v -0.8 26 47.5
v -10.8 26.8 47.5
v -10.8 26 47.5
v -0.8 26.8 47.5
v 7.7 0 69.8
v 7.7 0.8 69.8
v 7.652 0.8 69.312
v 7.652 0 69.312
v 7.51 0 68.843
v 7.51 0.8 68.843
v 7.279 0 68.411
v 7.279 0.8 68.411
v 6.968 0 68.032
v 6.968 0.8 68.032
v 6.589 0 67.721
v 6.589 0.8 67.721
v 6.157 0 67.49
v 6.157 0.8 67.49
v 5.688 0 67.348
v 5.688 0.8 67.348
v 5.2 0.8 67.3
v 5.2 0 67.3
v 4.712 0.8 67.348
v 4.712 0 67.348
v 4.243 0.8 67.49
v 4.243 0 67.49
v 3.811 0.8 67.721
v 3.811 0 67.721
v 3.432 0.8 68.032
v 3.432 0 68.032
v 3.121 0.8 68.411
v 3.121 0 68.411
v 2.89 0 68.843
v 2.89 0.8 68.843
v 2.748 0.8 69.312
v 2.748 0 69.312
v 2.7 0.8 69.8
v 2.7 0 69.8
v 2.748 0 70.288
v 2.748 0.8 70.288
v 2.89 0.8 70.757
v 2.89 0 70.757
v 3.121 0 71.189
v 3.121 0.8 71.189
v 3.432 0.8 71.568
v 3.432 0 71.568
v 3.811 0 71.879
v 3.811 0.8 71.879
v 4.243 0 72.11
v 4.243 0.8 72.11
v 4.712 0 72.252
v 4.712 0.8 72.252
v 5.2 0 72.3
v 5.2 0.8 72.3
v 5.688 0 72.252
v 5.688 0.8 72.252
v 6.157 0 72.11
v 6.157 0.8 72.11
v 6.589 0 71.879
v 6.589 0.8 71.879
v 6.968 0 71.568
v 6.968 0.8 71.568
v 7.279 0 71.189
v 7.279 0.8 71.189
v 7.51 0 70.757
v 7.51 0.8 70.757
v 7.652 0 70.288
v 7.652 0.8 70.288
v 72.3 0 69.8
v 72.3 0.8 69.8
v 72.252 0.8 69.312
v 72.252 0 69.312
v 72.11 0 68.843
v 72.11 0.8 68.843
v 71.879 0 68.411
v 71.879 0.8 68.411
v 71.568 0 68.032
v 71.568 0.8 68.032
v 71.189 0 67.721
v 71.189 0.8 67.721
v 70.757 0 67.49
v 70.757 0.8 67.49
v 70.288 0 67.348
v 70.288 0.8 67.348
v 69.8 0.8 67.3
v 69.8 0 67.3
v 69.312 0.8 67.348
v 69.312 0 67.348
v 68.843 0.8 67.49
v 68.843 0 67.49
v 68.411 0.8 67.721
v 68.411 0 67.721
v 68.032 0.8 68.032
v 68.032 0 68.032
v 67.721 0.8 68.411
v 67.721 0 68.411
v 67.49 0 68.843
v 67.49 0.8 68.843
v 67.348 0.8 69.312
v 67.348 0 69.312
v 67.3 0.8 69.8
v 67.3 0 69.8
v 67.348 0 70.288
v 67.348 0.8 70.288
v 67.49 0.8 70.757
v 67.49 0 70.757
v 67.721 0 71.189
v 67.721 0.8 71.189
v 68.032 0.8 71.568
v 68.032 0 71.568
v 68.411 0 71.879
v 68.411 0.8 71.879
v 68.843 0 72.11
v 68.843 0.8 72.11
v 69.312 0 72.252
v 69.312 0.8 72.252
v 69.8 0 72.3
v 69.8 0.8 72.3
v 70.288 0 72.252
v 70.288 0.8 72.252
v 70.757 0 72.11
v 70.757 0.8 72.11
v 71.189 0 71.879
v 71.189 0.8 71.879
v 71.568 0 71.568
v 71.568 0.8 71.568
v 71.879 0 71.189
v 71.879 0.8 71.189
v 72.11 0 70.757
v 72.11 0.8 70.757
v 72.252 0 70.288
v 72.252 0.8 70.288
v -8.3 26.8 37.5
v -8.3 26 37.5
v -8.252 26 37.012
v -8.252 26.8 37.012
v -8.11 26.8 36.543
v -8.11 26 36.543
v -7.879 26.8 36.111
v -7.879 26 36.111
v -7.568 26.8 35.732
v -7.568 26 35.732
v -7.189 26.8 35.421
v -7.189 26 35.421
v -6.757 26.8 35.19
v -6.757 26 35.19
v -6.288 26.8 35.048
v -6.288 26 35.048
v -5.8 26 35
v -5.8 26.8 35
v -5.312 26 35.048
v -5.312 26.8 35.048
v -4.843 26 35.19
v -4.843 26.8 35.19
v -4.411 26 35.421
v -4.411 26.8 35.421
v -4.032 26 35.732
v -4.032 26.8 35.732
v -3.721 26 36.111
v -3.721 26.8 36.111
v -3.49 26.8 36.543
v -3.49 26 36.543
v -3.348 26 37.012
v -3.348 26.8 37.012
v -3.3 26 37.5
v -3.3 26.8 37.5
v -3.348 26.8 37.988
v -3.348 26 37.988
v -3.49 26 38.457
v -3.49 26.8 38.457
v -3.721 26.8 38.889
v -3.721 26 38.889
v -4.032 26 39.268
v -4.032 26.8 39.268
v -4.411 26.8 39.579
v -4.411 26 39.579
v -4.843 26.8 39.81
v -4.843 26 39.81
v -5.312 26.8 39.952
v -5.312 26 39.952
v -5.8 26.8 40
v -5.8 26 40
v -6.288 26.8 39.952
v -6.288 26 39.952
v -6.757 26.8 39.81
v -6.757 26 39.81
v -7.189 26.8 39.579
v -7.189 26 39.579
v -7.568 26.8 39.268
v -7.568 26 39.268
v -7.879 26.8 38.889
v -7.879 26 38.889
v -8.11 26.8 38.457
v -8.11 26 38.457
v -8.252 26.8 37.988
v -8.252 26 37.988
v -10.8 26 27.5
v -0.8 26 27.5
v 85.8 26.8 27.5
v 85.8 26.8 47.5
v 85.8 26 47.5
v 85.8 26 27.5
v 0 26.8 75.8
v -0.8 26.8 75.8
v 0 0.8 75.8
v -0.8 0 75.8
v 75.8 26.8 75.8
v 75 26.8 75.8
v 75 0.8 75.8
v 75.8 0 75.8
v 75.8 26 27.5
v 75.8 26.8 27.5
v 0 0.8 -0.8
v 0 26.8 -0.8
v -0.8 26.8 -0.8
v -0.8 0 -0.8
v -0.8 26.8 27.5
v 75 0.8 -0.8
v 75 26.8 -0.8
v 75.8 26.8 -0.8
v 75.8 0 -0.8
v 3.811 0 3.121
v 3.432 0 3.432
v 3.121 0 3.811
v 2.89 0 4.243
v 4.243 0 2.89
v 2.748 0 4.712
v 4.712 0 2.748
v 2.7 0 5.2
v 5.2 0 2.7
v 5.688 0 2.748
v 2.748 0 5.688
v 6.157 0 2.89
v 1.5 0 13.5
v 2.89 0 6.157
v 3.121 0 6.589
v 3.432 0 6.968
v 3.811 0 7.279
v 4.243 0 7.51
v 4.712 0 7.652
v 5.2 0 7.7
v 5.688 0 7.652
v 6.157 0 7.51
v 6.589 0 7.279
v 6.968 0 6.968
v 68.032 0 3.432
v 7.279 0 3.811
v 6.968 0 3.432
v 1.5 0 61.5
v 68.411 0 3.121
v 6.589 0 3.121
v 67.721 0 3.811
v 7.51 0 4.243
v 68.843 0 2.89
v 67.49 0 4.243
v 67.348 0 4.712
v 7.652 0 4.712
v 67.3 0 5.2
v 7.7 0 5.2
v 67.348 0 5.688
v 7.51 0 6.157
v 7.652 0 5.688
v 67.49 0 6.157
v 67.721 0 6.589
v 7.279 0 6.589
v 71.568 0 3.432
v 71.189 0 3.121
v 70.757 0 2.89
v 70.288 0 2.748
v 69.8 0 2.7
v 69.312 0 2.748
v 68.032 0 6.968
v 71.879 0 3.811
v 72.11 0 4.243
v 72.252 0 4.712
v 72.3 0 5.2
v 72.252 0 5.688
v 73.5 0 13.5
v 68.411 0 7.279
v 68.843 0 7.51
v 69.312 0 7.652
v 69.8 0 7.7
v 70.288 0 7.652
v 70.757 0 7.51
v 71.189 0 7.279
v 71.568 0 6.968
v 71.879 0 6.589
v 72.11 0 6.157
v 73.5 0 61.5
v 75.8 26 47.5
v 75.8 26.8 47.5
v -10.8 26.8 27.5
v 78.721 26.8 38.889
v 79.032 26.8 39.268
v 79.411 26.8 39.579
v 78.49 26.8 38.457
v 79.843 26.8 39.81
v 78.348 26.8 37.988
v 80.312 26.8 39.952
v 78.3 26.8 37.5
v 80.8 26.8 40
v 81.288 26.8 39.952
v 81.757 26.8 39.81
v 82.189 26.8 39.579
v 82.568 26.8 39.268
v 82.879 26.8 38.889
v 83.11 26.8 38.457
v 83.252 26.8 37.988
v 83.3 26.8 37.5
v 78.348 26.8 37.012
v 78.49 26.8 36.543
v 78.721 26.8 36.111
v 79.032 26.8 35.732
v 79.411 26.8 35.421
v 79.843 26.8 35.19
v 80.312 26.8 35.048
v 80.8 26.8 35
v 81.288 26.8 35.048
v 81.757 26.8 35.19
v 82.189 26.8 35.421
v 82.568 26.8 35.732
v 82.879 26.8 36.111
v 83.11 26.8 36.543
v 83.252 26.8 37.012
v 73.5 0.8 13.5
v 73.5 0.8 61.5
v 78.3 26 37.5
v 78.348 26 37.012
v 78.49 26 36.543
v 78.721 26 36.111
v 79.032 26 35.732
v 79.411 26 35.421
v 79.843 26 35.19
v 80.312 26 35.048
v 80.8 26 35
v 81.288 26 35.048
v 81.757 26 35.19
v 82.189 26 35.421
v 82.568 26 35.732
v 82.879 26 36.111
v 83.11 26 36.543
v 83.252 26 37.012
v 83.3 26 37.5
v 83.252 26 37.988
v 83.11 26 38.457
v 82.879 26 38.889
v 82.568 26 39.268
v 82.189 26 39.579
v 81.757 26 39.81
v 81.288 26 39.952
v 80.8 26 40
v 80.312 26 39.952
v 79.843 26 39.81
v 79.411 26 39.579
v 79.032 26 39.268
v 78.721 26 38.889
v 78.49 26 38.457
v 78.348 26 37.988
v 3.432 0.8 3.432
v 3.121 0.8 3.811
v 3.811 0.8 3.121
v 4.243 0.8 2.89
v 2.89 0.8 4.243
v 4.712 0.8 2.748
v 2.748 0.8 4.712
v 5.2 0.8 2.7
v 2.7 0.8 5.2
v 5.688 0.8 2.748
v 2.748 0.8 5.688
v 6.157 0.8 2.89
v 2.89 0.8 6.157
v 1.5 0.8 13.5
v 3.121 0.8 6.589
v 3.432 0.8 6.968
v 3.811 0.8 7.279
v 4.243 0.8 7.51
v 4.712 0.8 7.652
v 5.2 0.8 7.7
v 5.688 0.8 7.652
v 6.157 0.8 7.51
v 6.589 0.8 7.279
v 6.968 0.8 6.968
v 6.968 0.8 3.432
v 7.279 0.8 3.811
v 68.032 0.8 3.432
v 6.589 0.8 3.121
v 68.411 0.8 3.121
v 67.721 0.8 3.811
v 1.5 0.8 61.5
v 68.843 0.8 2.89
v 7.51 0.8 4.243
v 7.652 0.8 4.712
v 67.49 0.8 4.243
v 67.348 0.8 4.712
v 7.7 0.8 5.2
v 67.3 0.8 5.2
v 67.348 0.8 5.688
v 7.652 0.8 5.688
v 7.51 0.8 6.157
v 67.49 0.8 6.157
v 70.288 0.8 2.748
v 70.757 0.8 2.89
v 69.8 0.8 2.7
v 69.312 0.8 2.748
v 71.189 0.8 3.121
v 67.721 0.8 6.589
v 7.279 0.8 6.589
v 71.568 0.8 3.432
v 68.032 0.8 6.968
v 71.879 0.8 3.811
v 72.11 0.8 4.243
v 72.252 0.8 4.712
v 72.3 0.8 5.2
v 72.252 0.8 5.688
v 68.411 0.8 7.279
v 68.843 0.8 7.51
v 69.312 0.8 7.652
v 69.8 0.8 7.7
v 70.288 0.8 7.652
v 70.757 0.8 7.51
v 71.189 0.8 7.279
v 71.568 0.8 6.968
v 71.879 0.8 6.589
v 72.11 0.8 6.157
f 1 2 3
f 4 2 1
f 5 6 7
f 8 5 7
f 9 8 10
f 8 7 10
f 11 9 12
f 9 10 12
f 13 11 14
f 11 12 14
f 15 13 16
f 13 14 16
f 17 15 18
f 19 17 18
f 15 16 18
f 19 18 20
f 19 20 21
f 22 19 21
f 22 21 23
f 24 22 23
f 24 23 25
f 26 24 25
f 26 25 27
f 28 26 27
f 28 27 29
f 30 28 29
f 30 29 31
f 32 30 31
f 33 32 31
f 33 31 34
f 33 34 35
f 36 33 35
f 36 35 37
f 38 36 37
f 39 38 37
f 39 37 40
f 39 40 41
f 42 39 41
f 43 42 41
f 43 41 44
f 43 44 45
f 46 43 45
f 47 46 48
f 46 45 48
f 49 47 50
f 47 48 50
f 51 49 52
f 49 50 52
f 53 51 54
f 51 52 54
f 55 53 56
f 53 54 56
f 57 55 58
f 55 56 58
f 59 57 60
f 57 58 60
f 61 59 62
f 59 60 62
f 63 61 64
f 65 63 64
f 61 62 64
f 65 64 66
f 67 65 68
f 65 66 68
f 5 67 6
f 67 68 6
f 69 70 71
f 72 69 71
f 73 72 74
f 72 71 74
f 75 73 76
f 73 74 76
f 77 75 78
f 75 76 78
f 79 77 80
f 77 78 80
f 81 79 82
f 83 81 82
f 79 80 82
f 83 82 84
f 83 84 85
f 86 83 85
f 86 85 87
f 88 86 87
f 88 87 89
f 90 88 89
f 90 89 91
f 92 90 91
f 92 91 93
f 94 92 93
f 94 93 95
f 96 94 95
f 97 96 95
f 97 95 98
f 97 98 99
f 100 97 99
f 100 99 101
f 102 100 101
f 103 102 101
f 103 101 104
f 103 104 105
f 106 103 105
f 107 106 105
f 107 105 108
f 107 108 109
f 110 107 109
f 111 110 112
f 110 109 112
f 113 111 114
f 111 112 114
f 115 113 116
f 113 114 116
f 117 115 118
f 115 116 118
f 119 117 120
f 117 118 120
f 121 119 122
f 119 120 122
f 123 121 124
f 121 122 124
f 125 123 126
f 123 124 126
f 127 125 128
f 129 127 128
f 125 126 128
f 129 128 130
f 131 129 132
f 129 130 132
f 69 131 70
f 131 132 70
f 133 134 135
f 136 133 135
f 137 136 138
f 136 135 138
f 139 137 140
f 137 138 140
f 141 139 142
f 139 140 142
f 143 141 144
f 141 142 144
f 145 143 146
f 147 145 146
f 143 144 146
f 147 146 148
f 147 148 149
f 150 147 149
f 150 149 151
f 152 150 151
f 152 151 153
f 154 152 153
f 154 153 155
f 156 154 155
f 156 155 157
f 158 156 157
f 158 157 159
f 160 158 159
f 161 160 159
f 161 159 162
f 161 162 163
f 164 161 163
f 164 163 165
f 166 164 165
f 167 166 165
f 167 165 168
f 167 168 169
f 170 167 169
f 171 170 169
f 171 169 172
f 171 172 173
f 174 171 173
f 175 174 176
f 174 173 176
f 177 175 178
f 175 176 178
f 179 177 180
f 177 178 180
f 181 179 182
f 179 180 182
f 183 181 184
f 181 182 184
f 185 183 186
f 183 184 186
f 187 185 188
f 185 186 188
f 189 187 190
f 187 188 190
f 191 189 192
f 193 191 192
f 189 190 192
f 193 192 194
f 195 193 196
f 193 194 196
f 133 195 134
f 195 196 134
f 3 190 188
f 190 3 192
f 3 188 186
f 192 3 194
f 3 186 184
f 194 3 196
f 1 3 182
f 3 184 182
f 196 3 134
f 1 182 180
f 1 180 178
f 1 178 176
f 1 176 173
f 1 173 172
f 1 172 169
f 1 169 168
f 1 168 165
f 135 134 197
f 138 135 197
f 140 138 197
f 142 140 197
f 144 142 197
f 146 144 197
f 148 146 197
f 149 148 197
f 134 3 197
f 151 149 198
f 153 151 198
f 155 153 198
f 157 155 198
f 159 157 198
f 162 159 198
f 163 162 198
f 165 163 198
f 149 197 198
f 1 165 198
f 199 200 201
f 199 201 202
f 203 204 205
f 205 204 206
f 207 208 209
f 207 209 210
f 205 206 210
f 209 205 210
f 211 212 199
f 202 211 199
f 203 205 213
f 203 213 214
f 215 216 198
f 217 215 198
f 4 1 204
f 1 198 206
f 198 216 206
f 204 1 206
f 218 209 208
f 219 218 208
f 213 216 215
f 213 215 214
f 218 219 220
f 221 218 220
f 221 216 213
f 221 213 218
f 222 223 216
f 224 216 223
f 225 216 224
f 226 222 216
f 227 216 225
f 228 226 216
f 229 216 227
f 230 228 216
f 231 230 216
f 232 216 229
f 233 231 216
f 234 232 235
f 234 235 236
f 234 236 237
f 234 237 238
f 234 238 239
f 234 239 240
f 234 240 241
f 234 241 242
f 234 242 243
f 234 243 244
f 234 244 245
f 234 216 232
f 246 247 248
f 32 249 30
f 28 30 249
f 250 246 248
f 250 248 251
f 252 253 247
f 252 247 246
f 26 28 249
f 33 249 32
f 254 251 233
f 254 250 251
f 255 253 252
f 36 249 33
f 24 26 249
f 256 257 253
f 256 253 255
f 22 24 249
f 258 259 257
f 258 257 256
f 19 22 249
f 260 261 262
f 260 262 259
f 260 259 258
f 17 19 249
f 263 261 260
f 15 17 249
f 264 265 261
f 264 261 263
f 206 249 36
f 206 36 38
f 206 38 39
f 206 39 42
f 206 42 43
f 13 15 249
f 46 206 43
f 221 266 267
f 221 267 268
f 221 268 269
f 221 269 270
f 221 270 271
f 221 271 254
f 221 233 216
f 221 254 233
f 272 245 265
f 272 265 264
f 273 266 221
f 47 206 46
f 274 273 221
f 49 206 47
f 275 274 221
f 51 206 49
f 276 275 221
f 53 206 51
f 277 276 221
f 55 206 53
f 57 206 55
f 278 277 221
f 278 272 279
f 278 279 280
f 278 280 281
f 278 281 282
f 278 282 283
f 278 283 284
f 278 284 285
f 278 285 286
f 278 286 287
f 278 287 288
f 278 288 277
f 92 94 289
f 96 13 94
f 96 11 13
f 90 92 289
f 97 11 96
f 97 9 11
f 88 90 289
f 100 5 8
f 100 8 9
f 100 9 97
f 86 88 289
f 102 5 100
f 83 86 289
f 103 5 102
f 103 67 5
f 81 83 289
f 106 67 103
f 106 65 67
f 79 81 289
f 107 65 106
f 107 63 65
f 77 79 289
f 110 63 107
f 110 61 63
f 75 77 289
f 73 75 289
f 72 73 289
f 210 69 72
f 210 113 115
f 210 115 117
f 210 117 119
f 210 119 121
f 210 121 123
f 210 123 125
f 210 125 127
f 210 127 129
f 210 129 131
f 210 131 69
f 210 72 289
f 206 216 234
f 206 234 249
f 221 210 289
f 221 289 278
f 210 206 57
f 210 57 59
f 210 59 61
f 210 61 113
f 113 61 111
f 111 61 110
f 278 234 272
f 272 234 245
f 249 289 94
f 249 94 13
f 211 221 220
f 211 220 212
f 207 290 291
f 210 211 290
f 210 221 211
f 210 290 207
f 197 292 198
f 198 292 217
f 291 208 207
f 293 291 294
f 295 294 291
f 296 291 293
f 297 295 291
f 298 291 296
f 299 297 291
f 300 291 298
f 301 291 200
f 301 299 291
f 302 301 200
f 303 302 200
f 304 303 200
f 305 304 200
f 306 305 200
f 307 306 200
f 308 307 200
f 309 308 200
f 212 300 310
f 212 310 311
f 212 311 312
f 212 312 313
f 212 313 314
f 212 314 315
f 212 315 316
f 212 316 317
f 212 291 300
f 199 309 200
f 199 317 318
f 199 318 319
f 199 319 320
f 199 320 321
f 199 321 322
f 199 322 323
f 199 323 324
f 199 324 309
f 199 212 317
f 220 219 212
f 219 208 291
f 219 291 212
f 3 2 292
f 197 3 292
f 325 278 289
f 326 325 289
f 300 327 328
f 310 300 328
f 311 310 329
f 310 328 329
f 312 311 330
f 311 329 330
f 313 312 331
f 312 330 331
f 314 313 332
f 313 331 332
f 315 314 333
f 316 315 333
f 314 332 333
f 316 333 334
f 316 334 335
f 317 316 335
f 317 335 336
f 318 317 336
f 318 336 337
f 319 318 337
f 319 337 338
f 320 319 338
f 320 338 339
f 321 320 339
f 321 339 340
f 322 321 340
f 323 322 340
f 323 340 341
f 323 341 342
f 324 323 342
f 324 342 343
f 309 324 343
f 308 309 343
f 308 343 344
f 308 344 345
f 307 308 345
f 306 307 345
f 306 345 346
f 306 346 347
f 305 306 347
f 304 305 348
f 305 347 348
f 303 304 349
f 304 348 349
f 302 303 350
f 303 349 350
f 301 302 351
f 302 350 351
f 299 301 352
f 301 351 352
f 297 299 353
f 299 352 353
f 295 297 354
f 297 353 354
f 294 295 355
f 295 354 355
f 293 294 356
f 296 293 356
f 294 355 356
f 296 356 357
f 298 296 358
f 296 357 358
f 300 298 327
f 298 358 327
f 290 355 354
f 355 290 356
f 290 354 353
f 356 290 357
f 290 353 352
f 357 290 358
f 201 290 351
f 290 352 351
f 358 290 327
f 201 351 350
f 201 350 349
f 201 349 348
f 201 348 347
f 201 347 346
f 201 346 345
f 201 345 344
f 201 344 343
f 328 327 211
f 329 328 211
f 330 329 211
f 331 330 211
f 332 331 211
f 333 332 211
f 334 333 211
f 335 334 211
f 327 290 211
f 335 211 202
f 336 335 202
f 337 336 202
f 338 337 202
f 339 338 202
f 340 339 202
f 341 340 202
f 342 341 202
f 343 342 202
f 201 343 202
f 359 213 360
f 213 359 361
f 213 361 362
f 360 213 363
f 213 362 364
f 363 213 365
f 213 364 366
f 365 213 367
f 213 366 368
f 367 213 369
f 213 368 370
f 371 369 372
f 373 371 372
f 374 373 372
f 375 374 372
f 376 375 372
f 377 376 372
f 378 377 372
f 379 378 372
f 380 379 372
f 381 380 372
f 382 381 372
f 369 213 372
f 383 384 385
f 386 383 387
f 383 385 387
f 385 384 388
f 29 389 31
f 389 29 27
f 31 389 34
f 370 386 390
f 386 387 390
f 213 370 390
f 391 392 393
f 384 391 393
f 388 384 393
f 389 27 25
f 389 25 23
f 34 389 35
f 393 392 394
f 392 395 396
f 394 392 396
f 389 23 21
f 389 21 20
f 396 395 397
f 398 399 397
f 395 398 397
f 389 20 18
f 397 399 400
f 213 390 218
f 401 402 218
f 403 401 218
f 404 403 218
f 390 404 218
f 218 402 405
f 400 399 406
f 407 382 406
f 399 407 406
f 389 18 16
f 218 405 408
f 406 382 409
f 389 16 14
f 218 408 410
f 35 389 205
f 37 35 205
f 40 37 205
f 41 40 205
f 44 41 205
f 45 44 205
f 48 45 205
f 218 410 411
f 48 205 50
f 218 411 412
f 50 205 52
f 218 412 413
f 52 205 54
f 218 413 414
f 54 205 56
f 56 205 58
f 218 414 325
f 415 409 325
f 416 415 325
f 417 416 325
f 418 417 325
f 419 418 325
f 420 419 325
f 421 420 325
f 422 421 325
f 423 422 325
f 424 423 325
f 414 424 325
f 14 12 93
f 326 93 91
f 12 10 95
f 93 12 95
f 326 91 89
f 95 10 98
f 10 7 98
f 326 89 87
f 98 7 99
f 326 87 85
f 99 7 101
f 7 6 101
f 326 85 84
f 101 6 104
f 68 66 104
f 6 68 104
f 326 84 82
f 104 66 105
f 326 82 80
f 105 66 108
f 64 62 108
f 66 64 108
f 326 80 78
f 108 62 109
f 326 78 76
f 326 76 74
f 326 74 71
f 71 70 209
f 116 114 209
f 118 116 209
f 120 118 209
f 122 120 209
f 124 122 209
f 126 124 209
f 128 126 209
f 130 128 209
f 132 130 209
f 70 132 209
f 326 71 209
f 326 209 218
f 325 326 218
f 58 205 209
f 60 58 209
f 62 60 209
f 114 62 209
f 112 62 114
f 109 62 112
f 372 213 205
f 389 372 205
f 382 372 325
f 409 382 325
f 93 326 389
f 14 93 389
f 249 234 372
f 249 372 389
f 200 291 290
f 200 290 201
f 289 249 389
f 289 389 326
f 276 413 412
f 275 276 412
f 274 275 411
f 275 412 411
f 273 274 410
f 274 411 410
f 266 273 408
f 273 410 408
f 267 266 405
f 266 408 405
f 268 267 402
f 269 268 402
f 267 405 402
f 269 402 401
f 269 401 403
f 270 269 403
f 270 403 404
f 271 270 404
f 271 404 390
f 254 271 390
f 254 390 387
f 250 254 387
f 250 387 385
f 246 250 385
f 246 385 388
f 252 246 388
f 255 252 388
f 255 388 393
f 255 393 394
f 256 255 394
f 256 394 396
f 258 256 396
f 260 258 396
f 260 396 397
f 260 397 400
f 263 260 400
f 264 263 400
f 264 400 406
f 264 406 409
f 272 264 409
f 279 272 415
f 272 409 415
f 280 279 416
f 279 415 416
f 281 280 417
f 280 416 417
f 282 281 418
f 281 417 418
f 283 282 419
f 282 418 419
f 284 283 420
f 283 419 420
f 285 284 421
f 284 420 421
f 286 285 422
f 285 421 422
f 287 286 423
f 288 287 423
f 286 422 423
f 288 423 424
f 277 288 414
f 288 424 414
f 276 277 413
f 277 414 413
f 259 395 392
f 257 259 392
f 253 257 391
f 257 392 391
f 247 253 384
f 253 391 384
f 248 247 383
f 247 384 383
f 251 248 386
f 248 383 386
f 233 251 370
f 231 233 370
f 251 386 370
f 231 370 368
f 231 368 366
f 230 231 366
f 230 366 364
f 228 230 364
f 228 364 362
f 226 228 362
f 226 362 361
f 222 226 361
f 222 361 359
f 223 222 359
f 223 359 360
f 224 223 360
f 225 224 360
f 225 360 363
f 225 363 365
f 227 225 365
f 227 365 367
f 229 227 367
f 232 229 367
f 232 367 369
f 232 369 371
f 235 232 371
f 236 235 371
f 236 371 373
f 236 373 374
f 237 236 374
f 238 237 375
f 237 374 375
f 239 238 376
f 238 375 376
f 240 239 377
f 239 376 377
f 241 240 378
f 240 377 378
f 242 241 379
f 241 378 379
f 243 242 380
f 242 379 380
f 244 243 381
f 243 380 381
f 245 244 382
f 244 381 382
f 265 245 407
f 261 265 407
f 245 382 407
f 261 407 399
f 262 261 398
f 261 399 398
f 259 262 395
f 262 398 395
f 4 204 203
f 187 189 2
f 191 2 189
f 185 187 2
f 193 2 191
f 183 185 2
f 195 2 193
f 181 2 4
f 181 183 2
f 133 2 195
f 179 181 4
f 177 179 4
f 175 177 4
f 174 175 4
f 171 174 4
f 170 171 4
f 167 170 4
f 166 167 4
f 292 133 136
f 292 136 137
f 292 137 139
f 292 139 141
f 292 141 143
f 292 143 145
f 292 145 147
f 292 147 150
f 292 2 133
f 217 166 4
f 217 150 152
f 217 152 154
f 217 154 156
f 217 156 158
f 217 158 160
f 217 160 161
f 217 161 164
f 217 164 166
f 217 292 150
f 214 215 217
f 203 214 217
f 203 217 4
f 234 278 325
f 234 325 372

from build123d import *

# Parameters (mm, degrees)
SKETCH_1_W          = 75
SKETCH_1_H          = 75
EXTRUDE_1_DEPTH     = 0.8
SKETCH_2_W          = 76.6
SKETCH_2_H          = 76.6
SKETCH_2_W_2        = 75
SKETCH_2_H_2        = 75
EXTRUDE_2_DEPTH     = 26.8
SKETCH_3_W          = 10.8
SKETCH_3_H          = 20
EXTRUDE_3_DEPTH     = 0.8
F_5_0MM_1_D         = 5
SKETCH_6_W          = 75
SKETCH_6_H          = 26
CUT_EXTRUDE_1_DEPTH = 119.099280269
F_5_0MM_2_D         = 5


with BuildPart() as part:
    # 草图1 → 凸台-拉伸1 (new body)
    with BuildSketch(Plane(origin=(0, 0, 0), x_dir=(1, 0, 0), z_dir=(0, 1, 0))):
        with Locations((37.5, -37.5)):
            Rectangle(SKETCH_1_W, SKETCH_1_H)
        Polygon((73.5, -37.5), (73.5, -13.5), (1.5, -13.5), (1.5, -61.5), (73.5, -61.5), align=None, mode=Mode.SUBTRACT)
    extrude(amount=EXTRUDE_1_DEPTH)

    # 草图2 → 凸台-拉伸2 (add)
    with BuildSketch(Plane.XZ):
        with Locations((37.5, 37.5)):
            Rectangle(SKETCH_2_W, SKETCH_2_H)
        with Locations((37.5, 37.5)):
            Rectangle(SKETCH_2_W_2, SKETCH_2_H_2, mode=Mode.SUBTRACT)
    extrude(amount=-EXTRUDE_2_DEPTH)

    # 草图3 → 凸台-拉伸3 (add)
    with BuildSketch(Plane(origin=(0, 26.8, 0), x_dir=(1, 0, 0), z_dir=(0, 1, 0))):
        with Locations((-5.4, -37.5)):
            Rectangle(SKETCH_3_W, SKETCH_3_H)
        with Locations((80.4, -37.5)):
            Rectangle(SKETCH_3_W, SKETCH_3_H)
    extrude(amount=-EXTRUDE_3_DEPTH)

    # Ø5.0mm 暗销孔1 (through all)
    with Locations(Plane(origin=(0, 26.8, 0), x_dir=(1, 0, 0), z_dir=(0, 1, 0))):
        with Locations((80.8, -37.5), (-5.8, -37.5)):
            Hole(F_5_0MM_1_D / 2)

    # 草图6 → 切除-拉伸1 (cut, through all)
    with BuildSketch(Plane.XY.offset(75.8)):
        with Locations((37.5, 13.8)):
            Rectangle(SKETCH_6_W, SKETCH_6_H)
    extrude(amount=-CUT_EXTRUDE_1_DEPTH, mode=Mode.SUBTRACT)

    # Ø5.0mm 暗销孔2 (through all)
    with Locations(Plane(origin=(0, 0, 0), x_dir=(-1, 0, 0), z_dir=(0, -1, 0))):
        with Locations((-69.8, -69.8), (-69.8, -5.2), (-5.2, -5.2), (-5.2, -69.8)):
            Hole(F_5_0MM_2_D / 2)


solid = part.part
